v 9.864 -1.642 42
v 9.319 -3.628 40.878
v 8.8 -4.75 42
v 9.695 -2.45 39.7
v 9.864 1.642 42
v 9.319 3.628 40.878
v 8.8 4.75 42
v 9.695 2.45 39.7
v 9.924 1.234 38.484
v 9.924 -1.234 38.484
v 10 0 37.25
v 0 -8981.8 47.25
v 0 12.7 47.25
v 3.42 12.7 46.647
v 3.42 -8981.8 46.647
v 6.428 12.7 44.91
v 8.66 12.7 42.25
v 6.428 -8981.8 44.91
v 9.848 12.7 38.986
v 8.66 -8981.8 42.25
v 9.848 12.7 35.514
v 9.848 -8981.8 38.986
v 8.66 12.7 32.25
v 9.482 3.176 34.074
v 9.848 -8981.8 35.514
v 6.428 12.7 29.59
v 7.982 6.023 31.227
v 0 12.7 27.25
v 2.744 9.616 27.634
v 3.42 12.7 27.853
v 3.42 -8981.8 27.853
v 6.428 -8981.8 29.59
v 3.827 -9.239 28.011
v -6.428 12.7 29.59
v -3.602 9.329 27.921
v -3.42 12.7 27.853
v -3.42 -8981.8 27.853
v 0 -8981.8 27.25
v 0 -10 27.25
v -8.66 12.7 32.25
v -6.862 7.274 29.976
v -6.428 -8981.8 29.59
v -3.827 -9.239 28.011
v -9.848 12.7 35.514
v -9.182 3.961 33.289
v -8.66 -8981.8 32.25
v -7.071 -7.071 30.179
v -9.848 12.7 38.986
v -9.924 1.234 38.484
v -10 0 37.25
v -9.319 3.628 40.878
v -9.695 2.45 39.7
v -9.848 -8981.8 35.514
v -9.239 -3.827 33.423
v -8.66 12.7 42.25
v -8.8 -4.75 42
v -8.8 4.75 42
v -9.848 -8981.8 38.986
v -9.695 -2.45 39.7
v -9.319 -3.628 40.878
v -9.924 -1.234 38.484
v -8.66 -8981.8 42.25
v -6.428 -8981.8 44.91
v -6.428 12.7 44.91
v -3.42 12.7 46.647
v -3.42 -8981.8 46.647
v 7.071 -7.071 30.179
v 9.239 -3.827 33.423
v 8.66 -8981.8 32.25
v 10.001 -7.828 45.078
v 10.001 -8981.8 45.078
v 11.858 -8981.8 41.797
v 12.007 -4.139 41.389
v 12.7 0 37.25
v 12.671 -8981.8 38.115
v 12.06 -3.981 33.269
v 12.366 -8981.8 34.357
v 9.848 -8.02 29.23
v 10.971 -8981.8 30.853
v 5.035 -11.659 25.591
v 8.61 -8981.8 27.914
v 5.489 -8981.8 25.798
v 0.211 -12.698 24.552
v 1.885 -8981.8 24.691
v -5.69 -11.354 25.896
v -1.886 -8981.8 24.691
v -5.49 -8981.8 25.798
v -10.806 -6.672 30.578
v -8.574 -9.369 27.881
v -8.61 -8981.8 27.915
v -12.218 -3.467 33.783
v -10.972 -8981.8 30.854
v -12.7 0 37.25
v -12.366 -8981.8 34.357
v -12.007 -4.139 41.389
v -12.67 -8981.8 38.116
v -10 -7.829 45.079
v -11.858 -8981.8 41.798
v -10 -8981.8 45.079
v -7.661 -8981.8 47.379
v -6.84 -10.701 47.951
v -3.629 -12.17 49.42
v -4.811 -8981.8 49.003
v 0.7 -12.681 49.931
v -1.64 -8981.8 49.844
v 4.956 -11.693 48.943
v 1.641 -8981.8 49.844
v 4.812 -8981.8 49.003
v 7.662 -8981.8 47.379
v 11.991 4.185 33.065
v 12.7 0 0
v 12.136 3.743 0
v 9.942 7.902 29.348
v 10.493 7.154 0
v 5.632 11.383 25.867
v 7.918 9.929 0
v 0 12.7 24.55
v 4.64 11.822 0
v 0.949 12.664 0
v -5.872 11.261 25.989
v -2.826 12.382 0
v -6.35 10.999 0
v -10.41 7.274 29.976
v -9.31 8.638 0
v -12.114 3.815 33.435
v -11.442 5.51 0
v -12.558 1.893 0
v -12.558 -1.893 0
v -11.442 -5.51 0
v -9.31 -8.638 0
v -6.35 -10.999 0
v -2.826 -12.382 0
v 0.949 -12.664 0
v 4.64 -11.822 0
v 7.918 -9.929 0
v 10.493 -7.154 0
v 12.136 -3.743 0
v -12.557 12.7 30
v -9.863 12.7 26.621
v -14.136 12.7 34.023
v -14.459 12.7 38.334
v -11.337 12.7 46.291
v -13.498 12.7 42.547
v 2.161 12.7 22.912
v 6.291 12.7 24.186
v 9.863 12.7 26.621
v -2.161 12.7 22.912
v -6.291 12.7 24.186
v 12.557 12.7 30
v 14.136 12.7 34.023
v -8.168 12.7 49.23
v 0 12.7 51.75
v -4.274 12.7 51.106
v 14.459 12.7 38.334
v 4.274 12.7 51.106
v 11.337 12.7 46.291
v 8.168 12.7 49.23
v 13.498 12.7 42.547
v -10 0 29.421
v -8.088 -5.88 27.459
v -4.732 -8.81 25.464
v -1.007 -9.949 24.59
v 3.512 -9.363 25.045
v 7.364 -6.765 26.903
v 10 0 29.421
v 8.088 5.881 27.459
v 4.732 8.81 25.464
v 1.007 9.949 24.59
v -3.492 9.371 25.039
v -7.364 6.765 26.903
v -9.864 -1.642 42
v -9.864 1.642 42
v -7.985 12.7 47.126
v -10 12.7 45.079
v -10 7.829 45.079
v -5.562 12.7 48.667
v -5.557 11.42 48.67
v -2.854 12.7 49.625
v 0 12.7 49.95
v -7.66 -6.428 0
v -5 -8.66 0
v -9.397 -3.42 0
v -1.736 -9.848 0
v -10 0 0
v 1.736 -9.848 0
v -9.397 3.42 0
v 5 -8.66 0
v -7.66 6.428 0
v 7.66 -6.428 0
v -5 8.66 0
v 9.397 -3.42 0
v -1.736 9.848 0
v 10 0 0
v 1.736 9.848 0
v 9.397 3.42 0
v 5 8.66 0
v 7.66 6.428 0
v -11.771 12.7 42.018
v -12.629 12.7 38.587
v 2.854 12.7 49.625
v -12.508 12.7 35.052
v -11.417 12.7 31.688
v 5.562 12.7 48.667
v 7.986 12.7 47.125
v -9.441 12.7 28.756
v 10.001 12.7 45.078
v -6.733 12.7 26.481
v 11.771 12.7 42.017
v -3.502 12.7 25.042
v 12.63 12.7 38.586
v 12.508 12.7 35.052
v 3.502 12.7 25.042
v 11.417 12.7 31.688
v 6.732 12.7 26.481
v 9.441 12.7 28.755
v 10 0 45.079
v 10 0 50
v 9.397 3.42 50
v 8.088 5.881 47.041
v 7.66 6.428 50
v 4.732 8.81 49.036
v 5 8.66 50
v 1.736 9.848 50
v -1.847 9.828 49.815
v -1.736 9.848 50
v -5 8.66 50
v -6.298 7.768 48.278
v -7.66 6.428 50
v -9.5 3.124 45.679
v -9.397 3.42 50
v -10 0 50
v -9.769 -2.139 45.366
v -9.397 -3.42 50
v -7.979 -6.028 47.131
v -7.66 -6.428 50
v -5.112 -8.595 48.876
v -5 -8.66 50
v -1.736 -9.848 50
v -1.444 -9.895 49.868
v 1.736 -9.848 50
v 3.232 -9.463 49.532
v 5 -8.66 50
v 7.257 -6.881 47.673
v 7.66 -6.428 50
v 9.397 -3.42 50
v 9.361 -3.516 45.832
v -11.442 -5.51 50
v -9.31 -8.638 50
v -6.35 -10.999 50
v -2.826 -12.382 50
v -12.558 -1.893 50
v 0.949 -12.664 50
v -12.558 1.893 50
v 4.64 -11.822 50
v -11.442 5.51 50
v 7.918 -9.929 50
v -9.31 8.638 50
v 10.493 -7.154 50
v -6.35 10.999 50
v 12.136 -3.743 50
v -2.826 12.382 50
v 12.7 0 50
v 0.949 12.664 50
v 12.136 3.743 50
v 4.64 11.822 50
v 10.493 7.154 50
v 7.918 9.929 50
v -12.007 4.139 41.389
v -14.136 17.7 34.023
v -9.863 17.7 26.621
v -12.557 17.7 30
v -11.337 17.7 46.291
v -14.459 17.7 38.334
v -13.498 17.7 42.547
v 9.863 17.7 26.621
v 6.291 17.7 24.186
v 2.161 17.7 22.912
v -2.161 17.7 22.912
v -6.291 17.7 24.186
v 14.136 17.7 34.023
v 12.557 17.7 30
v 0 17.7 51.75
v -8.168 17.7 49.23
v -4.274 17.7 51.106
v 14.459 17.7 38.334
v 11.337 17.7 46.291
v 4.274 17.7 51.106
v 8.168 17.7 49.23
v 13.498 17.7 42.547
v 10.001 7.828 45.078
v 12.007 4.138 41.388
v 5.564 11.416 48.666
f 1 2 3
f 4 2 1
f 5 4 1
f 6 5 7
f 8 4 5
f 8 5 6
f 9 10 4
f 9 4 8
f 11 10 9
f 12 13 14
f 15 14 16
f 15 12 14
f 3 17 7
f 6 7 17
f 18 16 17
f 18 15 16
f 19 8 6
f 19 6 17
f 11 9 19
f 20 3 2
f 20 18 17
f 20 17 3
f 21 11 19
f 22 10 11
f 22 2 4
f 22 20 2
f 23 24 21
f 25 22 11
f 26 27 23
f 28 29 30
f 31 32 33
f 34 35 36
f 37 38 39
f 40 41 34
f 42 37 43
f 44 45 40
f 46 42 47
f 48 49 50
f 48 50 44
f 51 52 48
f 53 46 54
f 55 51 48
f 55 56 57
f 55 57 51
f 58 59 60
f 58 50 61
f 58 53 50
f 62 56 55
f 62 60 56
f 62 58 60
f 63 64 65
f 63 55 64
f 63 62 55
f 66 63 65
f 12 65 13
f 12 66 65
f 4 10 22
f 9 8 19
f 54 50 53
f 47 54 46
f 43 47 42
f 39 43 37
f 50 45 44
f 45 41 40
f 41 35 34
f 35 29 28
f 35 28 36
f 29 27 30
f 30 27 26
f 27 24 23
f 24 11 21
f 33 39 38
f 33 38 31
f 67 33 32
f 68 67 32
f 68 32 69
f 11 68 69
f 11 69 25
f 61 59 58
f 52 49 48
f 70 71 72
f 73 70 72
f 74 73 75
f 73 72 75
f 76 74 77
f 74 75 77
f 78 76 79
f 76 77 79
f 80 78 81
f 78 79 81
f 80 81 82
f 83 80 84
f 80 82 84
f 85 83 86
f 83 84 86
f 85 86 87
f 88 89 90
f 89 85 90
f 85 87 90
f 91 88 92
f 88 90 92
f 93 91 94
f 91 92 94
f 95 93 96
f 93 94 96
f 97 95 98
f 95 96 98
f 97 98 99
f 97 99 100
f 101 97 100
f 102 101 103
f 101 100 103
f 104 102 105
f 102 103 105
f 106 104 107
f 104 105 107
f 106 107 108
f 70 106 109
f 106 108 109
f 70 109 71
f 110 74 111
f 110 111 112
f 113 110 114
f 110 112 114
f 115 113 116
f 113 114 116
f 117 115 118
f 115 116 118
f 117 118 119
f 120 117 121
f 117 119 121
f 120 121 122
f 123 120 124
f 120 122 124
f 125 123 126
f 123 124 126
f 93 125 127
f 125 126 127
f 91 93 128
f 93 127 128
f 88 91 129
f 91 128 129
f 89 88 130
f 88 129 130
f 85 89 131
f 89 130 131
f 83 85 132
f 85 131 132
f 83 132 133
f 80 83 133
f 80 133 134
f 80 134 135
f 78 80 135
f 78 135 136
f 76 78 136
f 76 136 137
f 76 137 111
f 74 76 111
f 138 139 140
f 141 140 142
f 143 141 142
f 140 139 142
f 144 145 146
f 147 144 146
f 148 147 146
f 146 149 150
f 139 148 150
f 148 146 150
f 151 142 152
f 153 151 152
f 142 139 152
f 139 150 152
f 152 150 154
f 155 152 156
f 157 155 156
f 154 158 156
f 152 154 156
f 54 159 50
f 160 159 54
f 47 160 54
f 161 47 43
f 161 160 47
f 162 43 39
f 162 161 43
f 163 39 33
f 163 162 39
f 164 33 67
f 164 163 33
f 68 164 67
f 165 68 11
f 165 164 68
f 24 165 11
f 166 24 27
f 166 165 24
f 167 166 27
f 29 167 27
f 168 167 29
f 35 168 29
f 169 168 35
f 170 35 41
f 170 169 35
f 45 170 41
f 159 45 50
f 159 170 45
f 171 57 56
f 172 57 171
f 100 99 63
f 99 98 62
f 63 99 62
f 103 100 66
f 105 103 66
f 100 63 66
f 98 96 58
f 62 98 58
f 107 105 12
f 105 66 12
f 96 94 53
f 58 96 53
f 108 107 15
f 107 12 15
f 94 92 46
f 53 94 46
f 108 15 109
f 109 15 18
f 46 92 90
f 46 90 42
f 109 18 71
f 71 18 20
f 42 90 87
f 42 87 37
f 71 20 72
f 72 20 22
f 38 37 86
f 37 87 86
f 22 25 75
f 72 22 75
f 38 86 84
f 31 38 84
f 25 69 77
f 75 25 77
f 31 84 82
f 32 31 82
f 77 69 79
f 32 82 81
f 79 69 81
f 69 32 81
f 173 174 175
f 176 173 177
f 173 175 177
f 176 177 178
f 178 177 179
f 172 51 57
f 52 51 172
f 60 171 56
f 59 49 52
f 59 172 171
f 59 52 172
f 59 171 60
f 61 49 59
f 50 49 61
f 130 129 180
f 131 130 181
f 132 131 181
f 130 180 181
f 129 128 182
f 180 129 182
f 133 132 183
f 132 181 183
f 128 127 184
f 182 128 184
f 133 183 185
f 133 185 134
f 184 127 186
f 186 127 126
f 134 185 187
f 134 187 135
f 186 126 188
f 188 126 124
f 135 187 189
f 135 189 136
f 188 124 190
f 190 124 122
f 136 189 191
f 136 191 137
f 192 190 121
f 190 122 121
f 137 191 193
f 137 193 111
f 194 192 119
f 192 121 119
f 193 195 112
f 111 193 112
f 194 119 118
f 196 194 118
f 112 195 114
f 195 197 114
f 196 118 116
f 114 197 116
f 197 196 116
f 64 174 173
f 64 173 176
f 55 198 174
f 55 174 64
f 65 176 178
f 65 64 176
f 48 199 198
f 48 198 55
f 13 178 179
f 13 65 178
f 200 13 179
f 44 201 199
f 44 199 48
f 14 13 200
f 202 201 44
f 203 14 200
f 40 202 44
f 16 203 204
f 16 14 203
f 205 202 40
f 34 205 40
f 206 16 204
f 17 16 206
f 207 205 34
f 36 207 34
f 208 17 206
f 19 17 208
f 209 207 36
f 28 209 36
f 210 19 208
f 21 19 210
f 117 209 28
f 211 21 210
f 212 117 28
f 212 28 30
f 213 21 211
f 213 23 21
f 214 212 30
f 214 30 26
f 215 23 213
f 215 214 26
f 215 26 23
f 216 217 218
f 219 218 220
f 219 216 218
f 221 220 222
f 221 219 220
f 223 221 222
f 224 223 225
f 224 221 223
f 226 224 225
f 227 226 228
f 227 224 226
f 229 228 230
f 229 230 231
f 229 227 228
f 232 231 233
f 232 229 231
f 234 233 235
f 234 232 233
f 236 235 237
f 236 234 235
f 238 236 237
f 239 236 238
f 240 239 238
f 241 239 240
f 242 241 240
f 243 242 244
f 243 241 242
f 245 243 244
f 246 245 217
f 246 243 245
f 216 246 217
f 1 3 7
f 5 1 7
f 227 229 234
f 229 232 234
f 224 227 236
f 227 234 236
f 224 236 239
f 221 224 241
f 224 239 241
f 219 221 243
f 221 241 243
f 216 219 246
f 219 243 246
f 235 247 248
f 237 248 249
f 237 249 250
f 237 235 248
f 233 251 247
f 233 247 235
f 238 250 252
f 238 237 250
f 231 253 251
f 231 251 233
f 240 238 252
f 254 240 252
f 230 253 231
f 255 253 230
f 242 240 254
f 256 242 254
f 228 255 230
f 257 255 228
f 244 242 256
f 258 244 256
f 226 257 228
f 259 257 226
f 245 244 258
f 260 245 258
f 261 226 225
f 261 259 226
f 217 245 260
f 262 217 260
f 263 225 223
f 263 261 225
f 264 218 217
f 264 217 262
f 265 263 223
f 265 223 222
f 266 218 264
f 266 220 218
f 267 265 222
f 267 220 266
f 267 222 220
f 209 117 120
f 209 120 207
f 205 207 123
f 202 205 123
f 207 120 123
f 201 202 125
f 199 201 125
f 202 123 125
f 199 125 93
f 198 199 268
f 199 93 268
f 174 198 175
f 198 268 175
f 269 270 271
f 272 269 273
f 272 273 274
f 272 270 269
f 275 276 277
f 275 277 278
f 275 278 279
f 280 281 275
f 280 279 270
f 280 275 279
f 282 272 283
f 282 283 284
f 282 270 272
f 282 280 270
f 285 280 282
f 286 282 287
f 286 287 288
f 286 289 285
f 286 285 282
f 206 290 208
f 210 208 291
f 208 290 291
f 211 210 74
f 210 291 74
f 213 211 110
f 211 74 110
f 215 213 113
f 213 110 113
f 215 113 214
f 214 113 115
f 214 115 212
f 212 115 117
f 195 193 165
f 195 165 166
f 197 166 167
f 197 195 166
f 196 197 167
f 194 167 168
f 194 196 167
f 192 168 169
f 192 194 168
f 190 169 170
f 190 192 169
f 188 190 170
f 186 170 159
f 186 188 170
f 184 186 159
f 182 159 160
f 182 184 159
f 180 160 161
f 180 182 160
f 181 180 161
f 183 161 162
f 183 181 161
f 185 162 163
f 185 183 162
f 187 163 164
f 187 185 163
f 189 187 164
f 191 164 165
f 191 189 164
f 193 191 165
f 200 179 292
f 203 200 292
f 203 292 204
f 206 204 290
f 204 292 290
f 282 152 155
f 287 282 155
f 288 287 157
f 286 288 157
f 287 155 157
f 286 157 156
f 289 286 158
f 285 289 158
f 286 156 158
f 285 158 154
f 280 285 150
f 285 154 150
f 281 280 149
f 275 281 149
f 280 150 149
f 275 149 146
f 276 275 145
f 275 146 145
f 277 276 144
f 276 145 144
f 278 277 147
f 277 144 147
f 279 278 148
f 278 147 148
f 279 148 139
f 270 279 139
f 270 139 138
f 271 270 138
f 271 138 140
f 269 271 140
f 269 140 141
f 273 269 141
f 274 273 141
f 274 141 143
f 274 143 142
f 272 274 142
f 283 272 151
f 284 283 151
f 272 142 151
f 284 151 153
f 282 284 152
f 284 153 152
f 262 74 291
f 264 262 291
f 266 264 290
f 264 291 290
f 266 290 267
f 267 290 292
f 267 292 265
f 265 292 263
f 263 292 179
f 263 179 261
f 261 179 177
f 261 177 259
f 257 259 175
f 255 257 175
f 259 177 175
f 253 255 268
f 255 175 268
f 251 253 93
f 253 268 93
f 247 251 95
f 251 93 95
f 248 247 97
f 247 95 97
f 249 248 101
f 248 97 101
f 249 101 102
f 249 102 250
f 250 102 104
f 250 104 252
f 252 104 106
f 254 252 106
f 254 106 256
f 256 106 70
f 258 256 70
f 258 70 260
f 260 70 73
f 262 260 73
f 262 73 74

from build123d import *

# Parameters (mm, degrees)
CROQUIS1_R                 = 12.7
CROQUIS1_R_2               = 10
SALIENTE_EXTRUIR1_DEPTH    = 50
SALIENTE_EXTRUIR2_START    = -8969.1
SALIENTE_EXTRUIR2_DEPTH    = 8994.5
CORTAR_EXTRUIR1_DEPTH      = 8970.248357687
CORTAR_EXTRUIR1_DEPTH_BACK = 8970.248357687
CROQUIS3_R                 = 10
CROQUIS4_R                 = 10
CORTAR_EXTRUIR2_DEPTH      = 42
CROQUIS5_R                 = 14.5
SALIENTE_EXTRUIR4_DEPTH    = 5


# Read off the part's stored shape, not the designer's step: Saliente-Extruir2
with BuildPart() as part:
    # Croquis1 → Saliente-Extruir1 (new body)
    with BuildSketch(Plane.XY):
        Circle(CROQUIS1_R)
        Circle(CROQUIS1_R_2, mode=Mode.SUBTRACT)
    extrude(amount=SALIENTE_EXTRUIR1_DEPTH)

    # Saliente-Extruir2 outline → Saliente-Extruir2 (add)
    with BuildSketch(Plane(origin=(0, -12.7, 0), x_dir=(1, 0, 0), z_dir=(0, 1, 0)).offset(SALIENTE_EXTRUIR2_START)):
        with BuildLine():
            ThreePointArc((-10.00000081, -45.078791975), (0.000421906, -49.949999993), (10.000520948, -45.07812754))
            ThreePointArc((10.000520948, -45.07812754), (-0.000421906, -24.550000007), (-10.00000081, -45.078791975))
        make_face()
    extrude(amount=SALIENTE_EXTRUIR2_DEPTH)

    # Croquis3 → Cortar-Extruir1 (cut, two sides: drawn at the far end of the back side and taken through both)
    with BuildSketch(Plane(origin=(0, -12.7, 0), x_dir=(1, 0, 0), z_dir=(0, 1, 0)).offset(-CORTAR_EXTRUIR1_DEPTH_BACK)):
        with Locations(Location((0, -37.25, 0), (0, 0, 270))):
            Circle(CROQUIS3_R)
    extrude(amount=CORTAR_EXTRUIR1_DEPTH + CORTAR_EXTRUIR1_DEPTH_BACK, mode=Mode.SUBTRACT)

    # Croquis4 → Cortar-Extruir2 (cut)
    with BuildSketch(Plane.XY):
        with Locations(Location((0, 0, 0), (0, 0, 180))):
            Circle(CROQUIS4_R)
    extrude(amount=CORTAR_EXTRUIR2_DEPTH, mode=Mode.SUBTRACT)


with BuildPart() as body_2:
    # Croquis5 → Saliente-Extruir4 (new body)
    with BuildSketch(Plane(origin=(0, 12.7, 0), x_dir=(1, 0, 0), z_dir=(0, 1, 0))):
        with Locations(Location((0, -37.25, 0), (0, 0, 270))):
            Circle(CROQUIS5_R)
    extrude(amount=SALIENTE_EXTRUIR4_DEPTH)


solid = Compound([part.part, body_2.part])
